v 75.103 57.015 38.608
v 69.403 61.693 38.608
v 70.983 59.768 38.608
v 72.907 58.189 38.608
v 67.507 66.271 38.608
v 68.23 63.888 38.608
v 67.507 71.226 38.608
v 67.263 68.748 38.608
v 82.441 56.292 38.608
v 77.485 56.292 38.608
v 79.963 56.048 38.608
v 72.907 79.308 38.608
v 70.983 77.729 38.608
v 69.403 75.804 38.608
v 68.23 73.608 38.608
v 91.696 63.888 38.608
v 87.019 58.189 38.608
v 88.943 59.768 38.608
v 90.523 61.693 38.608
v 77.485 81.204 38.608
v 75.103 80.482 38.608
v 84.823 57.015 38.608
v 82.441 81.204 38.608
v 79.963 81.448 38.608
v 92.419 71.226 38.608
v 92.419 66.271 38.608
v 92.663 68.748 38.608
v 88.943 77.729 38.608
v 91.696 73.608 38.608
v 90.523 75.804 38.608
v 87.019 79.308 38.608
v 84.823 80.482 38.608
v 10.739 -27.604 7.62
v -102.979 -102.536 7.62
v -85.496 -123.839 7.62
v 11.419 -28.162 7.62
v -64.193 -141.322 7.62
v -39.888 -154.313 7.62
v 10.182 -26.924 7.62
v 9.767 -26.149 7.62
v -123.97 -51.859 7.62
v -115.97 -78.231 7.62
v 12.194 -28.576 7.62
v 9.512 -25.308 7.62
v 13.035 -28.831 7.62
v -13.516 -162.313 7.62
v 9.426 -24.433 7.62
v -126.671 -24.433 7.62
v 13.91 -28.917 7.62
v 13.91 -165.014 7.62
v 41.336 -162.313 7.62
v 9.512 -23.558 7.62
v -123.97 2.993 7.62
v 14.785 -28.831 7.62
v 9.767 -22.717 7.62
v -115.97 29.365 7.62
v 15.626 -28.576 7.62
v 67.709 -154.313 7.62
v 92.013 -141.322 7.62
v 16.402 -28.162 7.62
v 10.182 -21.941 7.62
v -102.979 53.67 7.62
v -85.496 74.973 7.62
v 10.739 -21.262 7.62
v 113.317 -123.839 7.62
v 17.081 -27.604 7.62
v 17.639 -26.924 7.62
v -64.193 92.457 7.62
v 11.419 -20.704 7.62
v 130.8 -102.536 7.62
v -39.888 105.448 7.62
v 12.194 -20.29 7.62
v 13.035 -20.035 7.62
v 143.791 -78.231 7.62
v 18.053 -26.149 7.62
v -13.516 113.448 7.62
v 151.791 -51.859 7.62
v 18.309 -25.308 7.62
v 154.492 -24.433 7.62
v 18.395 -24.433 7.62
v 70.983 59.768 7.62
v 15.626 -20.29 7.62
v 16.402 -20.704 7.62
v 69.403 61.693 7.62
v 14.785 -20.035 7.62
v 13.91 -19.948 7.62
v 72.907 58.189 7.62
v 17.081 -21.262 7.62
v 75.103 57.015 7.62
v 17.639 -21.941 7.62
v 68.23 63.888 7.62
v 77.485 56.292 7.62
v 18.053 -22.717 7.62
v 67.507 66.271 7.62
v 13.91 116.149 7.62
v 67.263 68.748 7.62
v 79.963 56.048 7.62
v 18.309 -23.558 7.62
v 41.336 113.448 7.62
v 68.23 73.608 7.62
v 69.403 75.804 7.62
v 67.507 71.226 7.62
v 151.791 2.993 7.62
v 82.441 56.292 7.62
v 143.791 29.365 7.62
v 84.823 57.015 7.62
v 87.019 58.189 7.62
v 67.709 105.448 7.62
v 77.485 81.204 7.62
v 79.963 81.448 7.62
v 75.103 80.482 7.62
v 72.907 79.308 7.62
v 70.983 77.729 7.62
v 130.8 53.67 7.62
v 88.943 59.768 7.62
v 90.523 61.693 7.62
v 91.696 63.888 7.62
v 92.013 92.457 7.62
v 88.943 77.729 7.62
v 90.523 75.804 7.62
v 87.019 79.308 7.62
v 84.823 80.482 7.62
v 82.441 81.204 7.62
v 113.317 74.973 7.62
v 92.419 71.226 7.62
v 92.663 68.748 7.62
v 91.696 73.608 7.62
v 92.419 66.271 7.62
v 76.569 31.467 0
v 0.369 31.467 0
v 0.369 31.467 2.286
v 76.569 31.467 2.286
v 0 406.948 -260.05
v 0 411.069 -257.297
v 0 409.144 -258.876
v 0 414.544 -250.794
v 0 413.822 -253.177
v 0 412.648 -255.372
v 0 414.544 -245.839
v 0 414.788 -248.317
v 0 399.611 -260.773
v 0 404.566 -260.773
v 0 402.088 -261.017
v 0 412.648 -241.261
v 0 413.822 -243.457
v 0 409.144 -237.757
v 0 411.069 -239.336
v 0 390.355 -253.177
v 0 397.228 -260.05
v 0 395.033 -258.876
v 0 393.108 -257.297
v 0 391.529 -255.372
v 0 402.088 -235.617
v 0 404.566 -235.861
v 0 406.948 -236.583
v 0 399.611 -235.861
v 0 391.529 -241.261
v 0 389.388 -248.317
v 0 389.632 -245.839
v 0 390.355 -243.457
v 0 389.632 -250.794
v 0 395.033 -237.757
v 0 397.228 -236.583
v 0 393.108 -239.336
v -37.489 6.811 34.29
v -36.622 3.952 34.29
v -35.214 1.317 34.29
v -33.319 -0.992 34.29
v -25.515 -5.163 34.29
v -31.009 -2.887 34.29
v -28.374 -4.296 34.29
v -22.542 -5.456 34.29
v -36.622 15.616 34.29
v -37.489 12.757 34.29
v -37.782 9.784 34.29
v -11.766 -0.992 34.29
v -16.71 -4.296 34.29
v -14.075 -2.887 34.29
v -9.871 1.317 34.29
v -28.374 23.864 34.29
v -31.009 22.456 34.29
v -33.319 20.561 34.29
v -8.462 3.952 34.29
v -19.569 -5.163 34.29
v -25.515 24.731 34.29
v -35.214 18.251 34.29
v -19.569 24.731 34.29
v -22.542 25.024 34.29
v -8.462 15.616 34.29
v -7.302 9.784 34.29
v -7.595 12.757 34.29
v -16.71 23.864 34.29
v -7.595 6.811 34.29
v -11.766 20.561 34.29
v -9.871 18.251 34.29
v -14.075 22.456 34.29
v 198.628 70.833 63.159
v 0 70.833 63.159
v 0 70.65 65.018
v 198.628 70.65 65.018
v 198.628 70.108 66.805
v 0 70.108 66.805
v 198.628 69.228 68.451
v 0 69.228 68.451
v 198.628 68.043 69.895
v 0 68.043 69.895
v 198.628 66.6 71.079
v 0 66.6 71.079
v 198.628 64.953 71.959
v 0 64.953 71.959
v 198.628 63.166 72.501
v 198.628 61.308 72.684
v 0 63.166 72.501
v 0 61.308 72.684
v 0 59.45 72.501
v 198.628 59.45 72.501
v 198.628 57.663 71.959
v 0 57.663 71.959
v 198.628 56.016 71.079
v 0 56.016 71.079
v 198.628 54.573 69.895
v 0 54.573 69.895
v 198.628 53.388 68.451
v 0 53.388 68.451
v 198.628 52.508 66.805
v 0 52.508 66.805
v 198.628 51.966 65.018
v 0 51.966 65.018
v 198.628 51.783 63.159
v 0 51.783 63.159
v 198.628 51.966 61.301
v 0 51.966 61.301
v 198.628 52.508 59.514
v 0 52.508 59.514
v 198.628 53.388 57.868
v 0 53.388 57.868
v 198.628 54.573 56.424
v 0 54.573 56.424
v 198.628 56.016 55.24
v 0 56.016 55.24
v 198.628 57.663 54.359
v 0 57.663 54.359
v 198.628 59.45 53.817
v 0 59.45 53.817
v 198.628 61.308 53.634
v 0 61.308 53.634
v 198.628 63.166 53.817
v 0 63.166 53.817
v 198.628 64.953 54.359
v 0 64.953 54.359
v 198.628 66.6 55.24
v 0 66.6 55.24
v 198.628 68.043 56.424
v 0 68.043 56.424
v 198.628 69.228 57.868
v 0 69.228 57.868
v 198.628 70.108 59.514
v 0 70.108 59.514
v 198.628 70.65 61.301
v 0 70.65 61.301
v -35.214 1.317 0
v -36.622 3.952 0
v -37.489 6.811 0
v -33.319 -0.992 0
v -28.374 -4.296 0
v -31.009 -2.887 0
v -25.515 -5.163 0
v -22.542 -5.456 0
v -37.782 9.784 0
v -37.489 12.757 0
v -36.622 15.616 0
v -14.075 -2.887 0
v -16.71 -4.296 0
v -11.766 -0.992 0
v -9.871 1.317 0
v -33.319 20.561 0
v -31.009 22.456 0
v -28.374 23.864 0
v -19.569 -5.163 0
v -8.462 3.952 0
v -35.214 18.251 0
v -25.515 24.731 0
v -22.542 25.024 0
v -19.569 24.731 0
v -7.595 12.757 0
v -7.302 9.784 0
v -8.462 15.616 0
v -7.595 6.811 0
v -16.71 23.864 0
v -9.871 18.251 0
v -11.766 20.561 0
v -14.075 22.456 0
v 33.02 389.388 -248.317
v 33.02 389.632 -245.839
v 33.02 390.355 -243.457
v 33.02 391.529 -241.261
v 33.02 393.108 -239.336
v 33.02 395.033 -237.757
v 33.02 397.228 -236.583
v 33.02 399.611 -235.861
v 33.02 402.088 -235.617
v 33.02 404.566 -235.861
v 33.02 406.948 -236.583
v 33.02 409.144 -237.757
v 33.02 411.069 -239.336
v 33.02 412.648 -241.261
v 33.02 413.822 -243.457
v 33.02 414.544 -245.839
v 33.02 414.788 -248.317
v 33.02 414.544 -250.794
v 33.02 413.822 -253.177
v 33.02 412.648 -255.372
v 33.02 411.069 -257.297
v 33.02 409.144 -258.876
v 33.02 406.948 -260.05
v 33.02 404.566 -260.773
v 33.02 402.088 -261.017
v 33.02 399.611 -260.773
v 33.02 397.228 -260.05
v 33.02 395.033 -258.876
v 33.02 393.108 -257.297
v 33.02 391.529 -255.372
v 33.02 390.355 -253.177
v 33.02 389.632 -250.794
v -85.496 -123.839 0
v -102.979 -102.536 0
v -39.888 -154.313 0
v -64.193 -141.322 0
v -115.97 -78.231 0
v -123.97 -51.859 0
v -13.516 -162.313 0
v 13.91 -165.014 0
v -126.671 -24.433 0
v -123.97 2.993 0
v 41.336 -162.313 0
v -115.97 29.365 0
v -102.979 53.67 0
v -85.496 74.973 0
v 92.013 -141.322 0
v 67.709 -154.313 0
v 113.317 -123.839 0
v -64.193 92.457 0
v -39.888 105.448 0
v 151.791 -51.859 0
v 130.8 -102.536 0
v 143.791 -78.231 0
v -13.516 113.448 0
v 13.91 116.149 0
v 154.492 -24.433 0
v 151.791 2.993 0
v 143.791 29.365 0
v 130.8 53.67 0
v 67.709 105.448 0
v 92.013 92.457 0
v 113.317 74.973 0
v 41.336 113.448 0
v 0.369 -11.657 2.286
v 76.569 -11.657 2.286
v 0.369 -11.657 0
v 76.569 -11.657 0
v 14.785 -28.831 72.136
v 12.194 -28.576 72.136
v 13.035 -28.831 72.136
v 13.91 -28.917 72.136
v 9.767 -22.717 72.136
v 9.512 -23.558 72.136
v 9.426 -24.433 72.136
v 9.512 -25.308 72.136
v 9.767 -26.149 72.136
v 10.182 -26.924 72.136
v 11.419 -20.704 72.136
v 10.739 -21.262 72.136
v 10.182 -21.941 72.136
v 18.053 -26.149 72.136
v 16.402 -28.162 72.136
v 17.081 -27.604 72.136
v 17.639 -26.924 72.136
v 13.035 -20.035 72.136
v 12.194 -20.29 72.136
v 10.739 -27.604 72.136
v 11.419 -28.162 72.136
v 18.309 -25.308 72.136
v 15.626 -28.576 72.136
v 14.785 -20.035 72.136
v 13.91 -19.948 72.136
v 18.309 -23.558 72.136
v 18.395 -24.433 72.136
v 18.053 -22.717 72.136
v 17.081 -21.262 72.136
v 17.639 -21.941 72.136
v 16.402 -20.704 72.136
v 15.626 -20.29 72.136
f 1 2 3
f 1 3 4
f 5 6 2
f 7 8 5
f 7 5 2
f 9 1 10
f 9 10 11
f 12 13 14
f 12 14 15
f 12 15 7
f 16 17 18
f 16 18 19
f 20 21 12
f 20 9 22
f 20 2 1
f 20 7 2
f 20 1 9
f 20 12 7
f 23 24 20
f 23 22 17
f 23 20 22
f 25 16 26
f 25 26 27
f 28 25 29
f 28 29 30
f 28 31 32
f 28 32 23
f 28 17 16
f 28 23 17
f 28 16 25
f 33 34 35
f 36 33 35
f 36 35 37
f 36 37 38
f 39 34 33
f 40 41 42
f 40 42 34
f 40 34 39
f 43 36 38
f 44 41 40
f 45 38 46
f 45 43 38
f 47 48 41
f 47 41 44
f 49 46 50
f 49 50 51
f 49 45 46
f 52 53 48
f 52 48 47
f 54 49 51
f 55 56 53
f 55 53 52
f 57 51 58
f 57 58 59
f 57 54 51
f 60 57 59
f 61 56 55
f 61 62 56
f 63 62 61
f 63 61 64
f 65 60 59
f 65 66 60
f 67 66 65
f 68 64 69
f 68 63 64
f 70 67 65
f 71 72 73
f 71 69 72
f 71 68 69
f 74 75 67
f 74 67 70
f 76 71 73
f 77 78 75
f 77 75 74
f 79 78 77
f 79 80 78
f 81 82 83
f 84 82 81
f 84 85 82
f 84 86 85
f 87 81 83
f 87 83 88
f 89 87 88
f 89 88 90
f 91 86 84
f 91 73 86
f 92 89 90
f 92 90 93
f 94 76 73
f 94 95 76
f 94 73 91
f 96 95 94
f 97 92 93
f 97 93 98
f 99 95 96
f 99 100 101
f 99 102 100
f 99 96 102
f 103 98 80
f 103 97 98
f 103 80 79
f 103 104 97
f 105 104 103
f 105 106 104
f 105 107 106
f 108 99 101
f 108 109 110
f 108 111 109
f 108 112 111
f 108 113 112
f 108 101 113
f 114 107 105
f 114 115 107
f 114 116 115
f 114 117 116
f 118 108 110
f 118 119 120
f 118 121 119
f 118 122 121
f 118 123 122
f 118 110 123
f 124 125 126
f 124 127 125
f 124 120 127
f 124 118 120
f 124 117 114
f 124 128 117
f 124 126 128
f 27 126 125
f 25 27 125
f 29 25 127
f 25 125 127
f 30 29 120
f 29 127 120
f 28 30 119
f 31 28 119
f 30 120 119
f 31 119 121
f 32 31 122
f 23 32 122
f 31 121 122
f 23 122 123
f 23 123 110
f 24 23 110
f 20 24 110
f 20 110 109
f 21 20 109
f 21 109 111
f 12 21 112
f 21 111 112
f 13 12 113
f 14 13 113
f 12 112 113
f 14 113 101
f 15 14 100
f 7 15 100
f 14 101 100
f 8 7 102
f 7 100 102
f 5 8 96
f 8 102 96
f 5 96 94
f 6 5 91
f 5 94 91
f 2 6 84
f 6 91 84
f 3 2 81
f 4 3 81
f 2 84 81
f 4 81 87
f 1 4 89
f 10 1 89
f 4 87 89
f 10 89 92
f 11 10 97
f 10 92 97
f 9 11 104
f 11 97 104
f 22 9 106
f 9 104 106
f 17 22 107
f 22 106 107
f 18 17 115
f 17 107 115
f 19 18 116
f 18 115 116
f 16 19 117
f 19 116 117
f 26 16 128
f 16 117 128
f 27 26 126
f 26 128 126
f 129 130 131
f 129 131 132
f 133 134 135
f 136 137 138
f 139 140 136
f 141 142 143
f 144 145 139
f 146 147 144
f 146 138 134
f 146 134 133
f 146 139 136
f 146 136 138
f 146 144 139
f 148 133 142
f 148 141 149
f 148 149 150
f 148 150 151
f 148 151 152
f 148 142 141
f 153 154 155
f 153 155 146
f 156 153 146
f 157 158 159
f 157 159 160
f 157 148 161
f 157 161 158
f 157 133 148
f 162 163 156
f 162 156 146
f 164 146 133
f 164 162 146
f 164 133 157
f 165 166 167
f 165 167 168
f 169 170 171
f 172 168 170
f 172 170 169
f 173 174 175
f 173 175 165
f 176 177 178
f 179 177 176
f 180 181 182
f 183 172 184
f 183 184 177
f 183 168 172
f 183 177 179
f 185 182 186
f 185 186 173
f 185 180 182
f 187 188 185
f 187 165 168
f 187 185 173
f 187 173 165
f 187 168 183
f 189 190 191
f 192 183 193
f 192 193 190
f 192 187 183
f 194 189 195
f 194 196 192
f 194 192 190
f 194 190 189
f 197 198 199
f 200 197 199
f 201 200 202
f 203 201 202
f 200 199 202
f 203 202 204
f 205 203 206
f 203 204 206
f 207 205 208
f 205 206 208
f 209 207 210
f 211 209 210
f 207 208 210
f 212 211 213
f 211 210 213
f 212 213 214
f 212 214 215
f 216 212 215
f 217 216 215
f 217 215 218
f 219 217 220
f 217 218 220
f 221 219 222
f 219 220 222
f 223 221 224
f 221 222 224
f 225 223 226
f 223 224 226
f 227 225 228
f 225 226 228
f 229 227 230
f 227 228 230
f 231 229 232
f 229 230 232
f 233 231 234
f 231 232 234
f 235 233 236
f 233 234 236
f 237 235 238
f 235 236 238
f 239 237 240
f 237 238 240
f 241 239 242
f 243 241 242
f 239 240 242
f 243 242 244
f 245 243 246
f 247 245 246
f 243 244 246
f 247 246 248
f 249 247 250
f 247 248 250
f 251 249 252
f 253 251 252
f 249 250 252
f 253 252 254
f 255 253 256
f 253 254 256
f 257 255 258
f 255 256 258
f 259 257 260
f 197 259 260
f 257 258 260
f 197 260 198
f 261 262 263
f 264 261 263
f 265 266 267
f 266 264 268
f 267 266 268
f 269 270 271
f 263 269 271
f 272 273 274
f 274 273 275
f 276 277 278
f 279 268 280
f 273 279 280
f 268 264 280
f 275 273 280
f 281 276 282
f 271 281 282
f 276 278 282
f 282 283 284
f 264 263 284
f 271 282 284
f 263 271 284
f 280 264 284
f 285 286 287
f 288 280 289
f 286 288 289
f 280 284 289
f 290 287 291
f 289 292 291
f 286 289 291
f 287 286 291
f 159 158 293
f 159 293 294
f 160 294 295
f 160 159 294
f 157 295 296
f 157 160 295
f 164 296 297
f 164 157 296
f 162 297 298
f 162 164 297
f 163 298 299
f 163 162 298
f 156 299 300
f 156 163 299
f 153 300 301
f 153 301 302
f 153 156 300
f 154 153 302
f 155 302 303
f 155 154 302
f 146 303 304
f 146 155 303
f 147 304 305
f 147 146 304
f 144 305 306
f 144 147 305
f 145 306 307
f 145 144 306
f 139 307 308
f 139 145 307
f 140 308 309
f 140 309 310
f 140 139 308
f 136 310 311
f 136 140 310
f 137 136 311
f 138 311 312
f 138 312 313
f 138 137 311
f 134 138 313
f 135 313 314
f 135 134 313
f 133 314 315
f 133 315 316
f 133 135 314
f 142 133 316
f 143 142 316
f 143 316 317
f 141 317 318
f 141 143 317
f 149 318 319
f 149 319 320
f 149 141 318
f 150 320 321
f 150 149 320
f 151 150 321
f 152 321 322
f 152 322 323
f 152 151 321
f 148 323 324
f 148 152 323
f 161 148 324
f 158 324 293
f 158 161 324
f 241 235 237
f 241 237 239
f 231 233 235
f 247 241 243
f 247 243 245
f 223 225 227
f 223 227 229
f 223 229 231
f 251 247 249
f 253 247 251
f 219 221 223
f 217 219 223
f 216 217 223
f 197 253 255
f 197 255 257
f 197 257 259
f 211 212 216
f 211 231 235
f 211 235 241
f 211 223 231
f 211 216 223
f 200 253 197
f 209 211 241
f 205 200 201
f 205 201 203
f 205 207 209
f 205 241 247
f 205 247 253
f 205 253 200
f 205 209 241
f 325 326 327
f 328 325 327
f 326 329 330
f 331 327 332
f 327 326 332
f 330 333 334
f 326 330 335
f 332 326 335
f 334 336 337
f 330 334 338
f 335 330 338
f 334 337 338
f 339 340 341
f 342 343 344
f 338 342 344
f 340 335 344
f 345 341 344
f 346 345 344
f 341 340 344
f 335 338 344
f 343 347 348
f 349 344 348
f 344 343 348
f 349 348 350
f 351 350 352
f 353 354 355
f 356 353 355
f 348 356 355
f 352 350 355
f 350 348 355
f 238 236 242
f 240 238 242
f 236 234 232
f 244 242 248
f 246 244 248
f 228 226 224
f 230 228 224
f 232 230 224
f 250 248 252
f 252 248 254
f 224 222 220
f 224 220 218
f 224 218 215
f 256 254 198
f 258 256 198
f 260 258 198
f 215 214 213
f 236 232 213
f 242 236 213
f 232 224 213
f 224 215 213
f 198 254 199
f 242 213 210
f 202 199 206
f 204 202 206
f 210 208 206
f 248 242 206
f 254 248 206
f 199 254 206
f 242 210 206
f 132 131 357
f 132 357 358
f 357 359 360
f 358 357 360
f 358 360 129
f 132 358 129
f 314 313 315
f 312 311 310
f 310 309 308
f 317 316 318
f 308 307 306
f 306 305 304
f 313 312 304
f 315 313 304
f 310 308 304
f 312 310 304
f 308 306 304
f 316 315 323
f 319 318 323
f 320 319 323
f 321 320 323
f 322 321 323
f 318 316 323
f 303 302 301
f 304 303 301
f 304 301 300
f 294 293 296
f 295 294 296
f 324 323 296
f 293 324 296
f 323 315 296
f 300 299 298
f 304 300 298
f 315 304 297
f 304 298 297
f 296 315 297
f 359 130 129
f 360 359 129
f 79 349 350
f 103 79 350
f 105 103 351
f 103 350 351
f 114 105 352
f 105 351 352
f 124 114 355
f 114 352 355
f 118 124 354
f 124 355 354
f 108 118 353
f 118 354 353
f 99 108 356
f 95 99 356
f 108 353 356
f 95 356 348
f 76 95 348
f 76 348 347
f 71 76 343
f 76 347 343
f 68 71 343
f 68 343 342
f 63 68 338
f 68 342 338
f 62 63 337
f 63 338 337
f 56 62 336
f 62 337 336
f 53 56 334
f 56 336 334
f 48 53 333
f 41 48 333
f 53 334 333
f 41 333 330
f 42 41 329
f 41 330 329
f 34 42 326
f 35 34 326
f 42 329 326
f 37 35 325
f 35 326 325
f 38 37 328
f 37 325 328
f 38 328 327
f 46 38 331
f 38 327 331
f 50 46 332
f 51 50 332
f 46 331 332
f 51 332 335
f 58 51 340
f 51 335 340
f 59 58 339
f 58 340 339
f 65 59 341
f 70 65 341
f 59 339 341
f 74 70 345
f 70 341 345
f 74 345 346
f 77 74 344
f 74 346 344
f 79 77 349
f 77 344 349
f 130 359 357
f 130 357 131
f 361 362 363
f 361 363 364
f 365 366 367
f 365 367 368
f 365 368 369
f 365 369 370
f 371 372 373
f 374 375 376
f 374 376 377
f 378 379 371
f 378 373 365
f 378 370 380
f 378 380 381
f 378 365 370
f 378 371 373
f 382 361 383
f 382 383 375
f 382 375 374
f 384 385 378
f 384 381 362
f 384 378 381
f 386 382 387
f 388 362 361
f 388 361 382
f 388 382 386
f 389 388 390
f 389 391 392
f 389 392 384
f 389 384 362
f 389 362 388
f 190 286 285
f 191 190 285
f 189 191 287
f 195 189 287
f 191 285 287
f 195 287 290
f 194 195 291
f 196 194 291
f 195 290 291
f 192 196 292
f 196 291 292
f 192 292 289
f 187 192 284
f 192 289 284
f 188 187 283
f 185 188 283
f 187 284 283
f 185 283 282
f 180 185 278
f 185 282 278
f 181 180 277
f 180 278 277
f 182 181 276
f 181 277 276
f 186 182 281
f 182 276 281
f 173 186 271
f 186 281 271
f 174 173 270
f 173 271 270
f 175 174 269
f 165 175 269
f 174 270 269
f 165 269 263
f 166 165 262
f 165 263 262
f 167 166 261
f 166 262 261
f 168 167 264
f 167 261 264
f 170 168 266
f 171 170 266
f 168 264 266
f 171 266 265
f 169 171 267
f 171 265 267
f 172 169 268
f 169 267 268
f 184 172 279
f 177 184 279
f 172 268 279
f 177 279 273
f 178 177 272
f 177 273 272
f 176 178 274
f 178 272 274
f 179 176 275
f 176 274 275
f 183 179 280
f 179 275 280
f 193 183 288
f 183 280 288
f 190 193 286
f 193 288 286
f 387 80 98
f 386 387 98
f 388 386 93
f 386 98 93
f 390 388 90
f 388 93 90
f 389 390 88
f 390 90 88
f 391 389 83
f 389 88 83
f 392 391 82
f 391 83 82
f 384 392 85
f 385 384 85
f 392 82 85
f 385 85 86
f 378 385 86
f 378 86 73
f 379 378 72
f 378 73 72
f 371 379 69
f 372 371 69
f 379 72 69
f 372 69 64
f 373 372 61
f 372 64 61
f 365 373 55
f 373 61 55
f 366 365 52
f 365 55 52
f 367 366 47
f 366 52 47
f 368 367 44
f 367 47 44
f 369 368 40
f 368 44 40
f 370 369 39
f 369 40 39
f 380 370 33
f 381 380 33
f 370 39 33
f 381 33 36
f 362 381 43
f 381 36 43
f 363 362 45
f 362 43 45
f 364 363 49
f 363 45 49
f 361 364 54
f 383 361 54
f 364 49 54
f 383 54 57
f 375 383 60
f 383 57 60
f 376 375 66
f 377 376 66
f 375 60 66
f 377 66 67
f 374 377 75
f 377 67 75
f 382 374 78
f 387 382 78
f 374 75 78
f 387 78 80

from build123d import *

# Parameters (mm, degrees)
F0_R      = 15.24
F1_DEPTH  = 34.29
F2_W      = 76.2
F2_H      = 43.124175
F3_DEPTH  = 2.286
F4_R      = 140.581633
F5_DEPTH  = 7.62
F6_R      = 9.525
F7_DEPTH  = 198.628
F9_R      = 12.7
F10_DEPTH = 33.02
F11_R     = 12.7
F12_DEPTH = 30.988
F8_R      = 4.48449
F13_DEPTH = 64.516


with BuildPart() as f1:
    # F0 (on Top) → F1 (new body)
    with BuildSketch(Plane.XY):
        with Locations((-22.542197, 9.784274)):
            Circle(F0_R)
    extrude(amount=F1_DEPTH)


with BuildPart() as f3:
    # F2 (on Top) → F3 (new body)
    with BuildSketch(Plane.XY):
        with Locations((38.4693, 9.905269)):
            Rectangle(F2_W, F2_H)
    extrude(amount=F3_DEPTH)


with BuildPart() as f5:
    # F4 (on Top) → F5 (new body)
    with BuildSketch(Plane.XY):
        with Locations((13.910335, -24.432853)):
            Circle(F4_R)
    extrude(amount=F5_DEPTH)

    # F11 (on face) → F12 (join)
    with BuildSketch(Plane.XY.offset(7.62)):
        with Locations((79.962857, 68.748347)):
            Circle(F11_R)
    extrude(amount=F12_DEPTH)

    # F8 (on face) → F13 (join)
    with BuildSketch(Plane.XY.offset(7.62)):
        with Locations((13.910335, -24.432853)):
            Circle(F8_R)
    extrude(amount=F13_DEPTH)


with BuildPart() as f7:
    # F6 (on Right) → F7 (new body)
    with BuildSketch(Plane.YZ):
        with Locations((61.308052, 63.159451)):
            Circle(F6_R)
    extrude(amount=F7_DEPTH)


with BuildPart() as f10:
    # F9 (on face) → F10 (new body)
    with BuildSketch(Plane(origin=(0, 0, 0), x_dir=(0, -1, 0), z_dir=(-1, 0, 0))):
        with Locations((-402.088284, -248.316705)):
            Circle(F9_R)
    extrude(amount=-F10_DEPTH)


solid = Compound([f1.part, f3.part, f5.part, f7.part, f10.part])
